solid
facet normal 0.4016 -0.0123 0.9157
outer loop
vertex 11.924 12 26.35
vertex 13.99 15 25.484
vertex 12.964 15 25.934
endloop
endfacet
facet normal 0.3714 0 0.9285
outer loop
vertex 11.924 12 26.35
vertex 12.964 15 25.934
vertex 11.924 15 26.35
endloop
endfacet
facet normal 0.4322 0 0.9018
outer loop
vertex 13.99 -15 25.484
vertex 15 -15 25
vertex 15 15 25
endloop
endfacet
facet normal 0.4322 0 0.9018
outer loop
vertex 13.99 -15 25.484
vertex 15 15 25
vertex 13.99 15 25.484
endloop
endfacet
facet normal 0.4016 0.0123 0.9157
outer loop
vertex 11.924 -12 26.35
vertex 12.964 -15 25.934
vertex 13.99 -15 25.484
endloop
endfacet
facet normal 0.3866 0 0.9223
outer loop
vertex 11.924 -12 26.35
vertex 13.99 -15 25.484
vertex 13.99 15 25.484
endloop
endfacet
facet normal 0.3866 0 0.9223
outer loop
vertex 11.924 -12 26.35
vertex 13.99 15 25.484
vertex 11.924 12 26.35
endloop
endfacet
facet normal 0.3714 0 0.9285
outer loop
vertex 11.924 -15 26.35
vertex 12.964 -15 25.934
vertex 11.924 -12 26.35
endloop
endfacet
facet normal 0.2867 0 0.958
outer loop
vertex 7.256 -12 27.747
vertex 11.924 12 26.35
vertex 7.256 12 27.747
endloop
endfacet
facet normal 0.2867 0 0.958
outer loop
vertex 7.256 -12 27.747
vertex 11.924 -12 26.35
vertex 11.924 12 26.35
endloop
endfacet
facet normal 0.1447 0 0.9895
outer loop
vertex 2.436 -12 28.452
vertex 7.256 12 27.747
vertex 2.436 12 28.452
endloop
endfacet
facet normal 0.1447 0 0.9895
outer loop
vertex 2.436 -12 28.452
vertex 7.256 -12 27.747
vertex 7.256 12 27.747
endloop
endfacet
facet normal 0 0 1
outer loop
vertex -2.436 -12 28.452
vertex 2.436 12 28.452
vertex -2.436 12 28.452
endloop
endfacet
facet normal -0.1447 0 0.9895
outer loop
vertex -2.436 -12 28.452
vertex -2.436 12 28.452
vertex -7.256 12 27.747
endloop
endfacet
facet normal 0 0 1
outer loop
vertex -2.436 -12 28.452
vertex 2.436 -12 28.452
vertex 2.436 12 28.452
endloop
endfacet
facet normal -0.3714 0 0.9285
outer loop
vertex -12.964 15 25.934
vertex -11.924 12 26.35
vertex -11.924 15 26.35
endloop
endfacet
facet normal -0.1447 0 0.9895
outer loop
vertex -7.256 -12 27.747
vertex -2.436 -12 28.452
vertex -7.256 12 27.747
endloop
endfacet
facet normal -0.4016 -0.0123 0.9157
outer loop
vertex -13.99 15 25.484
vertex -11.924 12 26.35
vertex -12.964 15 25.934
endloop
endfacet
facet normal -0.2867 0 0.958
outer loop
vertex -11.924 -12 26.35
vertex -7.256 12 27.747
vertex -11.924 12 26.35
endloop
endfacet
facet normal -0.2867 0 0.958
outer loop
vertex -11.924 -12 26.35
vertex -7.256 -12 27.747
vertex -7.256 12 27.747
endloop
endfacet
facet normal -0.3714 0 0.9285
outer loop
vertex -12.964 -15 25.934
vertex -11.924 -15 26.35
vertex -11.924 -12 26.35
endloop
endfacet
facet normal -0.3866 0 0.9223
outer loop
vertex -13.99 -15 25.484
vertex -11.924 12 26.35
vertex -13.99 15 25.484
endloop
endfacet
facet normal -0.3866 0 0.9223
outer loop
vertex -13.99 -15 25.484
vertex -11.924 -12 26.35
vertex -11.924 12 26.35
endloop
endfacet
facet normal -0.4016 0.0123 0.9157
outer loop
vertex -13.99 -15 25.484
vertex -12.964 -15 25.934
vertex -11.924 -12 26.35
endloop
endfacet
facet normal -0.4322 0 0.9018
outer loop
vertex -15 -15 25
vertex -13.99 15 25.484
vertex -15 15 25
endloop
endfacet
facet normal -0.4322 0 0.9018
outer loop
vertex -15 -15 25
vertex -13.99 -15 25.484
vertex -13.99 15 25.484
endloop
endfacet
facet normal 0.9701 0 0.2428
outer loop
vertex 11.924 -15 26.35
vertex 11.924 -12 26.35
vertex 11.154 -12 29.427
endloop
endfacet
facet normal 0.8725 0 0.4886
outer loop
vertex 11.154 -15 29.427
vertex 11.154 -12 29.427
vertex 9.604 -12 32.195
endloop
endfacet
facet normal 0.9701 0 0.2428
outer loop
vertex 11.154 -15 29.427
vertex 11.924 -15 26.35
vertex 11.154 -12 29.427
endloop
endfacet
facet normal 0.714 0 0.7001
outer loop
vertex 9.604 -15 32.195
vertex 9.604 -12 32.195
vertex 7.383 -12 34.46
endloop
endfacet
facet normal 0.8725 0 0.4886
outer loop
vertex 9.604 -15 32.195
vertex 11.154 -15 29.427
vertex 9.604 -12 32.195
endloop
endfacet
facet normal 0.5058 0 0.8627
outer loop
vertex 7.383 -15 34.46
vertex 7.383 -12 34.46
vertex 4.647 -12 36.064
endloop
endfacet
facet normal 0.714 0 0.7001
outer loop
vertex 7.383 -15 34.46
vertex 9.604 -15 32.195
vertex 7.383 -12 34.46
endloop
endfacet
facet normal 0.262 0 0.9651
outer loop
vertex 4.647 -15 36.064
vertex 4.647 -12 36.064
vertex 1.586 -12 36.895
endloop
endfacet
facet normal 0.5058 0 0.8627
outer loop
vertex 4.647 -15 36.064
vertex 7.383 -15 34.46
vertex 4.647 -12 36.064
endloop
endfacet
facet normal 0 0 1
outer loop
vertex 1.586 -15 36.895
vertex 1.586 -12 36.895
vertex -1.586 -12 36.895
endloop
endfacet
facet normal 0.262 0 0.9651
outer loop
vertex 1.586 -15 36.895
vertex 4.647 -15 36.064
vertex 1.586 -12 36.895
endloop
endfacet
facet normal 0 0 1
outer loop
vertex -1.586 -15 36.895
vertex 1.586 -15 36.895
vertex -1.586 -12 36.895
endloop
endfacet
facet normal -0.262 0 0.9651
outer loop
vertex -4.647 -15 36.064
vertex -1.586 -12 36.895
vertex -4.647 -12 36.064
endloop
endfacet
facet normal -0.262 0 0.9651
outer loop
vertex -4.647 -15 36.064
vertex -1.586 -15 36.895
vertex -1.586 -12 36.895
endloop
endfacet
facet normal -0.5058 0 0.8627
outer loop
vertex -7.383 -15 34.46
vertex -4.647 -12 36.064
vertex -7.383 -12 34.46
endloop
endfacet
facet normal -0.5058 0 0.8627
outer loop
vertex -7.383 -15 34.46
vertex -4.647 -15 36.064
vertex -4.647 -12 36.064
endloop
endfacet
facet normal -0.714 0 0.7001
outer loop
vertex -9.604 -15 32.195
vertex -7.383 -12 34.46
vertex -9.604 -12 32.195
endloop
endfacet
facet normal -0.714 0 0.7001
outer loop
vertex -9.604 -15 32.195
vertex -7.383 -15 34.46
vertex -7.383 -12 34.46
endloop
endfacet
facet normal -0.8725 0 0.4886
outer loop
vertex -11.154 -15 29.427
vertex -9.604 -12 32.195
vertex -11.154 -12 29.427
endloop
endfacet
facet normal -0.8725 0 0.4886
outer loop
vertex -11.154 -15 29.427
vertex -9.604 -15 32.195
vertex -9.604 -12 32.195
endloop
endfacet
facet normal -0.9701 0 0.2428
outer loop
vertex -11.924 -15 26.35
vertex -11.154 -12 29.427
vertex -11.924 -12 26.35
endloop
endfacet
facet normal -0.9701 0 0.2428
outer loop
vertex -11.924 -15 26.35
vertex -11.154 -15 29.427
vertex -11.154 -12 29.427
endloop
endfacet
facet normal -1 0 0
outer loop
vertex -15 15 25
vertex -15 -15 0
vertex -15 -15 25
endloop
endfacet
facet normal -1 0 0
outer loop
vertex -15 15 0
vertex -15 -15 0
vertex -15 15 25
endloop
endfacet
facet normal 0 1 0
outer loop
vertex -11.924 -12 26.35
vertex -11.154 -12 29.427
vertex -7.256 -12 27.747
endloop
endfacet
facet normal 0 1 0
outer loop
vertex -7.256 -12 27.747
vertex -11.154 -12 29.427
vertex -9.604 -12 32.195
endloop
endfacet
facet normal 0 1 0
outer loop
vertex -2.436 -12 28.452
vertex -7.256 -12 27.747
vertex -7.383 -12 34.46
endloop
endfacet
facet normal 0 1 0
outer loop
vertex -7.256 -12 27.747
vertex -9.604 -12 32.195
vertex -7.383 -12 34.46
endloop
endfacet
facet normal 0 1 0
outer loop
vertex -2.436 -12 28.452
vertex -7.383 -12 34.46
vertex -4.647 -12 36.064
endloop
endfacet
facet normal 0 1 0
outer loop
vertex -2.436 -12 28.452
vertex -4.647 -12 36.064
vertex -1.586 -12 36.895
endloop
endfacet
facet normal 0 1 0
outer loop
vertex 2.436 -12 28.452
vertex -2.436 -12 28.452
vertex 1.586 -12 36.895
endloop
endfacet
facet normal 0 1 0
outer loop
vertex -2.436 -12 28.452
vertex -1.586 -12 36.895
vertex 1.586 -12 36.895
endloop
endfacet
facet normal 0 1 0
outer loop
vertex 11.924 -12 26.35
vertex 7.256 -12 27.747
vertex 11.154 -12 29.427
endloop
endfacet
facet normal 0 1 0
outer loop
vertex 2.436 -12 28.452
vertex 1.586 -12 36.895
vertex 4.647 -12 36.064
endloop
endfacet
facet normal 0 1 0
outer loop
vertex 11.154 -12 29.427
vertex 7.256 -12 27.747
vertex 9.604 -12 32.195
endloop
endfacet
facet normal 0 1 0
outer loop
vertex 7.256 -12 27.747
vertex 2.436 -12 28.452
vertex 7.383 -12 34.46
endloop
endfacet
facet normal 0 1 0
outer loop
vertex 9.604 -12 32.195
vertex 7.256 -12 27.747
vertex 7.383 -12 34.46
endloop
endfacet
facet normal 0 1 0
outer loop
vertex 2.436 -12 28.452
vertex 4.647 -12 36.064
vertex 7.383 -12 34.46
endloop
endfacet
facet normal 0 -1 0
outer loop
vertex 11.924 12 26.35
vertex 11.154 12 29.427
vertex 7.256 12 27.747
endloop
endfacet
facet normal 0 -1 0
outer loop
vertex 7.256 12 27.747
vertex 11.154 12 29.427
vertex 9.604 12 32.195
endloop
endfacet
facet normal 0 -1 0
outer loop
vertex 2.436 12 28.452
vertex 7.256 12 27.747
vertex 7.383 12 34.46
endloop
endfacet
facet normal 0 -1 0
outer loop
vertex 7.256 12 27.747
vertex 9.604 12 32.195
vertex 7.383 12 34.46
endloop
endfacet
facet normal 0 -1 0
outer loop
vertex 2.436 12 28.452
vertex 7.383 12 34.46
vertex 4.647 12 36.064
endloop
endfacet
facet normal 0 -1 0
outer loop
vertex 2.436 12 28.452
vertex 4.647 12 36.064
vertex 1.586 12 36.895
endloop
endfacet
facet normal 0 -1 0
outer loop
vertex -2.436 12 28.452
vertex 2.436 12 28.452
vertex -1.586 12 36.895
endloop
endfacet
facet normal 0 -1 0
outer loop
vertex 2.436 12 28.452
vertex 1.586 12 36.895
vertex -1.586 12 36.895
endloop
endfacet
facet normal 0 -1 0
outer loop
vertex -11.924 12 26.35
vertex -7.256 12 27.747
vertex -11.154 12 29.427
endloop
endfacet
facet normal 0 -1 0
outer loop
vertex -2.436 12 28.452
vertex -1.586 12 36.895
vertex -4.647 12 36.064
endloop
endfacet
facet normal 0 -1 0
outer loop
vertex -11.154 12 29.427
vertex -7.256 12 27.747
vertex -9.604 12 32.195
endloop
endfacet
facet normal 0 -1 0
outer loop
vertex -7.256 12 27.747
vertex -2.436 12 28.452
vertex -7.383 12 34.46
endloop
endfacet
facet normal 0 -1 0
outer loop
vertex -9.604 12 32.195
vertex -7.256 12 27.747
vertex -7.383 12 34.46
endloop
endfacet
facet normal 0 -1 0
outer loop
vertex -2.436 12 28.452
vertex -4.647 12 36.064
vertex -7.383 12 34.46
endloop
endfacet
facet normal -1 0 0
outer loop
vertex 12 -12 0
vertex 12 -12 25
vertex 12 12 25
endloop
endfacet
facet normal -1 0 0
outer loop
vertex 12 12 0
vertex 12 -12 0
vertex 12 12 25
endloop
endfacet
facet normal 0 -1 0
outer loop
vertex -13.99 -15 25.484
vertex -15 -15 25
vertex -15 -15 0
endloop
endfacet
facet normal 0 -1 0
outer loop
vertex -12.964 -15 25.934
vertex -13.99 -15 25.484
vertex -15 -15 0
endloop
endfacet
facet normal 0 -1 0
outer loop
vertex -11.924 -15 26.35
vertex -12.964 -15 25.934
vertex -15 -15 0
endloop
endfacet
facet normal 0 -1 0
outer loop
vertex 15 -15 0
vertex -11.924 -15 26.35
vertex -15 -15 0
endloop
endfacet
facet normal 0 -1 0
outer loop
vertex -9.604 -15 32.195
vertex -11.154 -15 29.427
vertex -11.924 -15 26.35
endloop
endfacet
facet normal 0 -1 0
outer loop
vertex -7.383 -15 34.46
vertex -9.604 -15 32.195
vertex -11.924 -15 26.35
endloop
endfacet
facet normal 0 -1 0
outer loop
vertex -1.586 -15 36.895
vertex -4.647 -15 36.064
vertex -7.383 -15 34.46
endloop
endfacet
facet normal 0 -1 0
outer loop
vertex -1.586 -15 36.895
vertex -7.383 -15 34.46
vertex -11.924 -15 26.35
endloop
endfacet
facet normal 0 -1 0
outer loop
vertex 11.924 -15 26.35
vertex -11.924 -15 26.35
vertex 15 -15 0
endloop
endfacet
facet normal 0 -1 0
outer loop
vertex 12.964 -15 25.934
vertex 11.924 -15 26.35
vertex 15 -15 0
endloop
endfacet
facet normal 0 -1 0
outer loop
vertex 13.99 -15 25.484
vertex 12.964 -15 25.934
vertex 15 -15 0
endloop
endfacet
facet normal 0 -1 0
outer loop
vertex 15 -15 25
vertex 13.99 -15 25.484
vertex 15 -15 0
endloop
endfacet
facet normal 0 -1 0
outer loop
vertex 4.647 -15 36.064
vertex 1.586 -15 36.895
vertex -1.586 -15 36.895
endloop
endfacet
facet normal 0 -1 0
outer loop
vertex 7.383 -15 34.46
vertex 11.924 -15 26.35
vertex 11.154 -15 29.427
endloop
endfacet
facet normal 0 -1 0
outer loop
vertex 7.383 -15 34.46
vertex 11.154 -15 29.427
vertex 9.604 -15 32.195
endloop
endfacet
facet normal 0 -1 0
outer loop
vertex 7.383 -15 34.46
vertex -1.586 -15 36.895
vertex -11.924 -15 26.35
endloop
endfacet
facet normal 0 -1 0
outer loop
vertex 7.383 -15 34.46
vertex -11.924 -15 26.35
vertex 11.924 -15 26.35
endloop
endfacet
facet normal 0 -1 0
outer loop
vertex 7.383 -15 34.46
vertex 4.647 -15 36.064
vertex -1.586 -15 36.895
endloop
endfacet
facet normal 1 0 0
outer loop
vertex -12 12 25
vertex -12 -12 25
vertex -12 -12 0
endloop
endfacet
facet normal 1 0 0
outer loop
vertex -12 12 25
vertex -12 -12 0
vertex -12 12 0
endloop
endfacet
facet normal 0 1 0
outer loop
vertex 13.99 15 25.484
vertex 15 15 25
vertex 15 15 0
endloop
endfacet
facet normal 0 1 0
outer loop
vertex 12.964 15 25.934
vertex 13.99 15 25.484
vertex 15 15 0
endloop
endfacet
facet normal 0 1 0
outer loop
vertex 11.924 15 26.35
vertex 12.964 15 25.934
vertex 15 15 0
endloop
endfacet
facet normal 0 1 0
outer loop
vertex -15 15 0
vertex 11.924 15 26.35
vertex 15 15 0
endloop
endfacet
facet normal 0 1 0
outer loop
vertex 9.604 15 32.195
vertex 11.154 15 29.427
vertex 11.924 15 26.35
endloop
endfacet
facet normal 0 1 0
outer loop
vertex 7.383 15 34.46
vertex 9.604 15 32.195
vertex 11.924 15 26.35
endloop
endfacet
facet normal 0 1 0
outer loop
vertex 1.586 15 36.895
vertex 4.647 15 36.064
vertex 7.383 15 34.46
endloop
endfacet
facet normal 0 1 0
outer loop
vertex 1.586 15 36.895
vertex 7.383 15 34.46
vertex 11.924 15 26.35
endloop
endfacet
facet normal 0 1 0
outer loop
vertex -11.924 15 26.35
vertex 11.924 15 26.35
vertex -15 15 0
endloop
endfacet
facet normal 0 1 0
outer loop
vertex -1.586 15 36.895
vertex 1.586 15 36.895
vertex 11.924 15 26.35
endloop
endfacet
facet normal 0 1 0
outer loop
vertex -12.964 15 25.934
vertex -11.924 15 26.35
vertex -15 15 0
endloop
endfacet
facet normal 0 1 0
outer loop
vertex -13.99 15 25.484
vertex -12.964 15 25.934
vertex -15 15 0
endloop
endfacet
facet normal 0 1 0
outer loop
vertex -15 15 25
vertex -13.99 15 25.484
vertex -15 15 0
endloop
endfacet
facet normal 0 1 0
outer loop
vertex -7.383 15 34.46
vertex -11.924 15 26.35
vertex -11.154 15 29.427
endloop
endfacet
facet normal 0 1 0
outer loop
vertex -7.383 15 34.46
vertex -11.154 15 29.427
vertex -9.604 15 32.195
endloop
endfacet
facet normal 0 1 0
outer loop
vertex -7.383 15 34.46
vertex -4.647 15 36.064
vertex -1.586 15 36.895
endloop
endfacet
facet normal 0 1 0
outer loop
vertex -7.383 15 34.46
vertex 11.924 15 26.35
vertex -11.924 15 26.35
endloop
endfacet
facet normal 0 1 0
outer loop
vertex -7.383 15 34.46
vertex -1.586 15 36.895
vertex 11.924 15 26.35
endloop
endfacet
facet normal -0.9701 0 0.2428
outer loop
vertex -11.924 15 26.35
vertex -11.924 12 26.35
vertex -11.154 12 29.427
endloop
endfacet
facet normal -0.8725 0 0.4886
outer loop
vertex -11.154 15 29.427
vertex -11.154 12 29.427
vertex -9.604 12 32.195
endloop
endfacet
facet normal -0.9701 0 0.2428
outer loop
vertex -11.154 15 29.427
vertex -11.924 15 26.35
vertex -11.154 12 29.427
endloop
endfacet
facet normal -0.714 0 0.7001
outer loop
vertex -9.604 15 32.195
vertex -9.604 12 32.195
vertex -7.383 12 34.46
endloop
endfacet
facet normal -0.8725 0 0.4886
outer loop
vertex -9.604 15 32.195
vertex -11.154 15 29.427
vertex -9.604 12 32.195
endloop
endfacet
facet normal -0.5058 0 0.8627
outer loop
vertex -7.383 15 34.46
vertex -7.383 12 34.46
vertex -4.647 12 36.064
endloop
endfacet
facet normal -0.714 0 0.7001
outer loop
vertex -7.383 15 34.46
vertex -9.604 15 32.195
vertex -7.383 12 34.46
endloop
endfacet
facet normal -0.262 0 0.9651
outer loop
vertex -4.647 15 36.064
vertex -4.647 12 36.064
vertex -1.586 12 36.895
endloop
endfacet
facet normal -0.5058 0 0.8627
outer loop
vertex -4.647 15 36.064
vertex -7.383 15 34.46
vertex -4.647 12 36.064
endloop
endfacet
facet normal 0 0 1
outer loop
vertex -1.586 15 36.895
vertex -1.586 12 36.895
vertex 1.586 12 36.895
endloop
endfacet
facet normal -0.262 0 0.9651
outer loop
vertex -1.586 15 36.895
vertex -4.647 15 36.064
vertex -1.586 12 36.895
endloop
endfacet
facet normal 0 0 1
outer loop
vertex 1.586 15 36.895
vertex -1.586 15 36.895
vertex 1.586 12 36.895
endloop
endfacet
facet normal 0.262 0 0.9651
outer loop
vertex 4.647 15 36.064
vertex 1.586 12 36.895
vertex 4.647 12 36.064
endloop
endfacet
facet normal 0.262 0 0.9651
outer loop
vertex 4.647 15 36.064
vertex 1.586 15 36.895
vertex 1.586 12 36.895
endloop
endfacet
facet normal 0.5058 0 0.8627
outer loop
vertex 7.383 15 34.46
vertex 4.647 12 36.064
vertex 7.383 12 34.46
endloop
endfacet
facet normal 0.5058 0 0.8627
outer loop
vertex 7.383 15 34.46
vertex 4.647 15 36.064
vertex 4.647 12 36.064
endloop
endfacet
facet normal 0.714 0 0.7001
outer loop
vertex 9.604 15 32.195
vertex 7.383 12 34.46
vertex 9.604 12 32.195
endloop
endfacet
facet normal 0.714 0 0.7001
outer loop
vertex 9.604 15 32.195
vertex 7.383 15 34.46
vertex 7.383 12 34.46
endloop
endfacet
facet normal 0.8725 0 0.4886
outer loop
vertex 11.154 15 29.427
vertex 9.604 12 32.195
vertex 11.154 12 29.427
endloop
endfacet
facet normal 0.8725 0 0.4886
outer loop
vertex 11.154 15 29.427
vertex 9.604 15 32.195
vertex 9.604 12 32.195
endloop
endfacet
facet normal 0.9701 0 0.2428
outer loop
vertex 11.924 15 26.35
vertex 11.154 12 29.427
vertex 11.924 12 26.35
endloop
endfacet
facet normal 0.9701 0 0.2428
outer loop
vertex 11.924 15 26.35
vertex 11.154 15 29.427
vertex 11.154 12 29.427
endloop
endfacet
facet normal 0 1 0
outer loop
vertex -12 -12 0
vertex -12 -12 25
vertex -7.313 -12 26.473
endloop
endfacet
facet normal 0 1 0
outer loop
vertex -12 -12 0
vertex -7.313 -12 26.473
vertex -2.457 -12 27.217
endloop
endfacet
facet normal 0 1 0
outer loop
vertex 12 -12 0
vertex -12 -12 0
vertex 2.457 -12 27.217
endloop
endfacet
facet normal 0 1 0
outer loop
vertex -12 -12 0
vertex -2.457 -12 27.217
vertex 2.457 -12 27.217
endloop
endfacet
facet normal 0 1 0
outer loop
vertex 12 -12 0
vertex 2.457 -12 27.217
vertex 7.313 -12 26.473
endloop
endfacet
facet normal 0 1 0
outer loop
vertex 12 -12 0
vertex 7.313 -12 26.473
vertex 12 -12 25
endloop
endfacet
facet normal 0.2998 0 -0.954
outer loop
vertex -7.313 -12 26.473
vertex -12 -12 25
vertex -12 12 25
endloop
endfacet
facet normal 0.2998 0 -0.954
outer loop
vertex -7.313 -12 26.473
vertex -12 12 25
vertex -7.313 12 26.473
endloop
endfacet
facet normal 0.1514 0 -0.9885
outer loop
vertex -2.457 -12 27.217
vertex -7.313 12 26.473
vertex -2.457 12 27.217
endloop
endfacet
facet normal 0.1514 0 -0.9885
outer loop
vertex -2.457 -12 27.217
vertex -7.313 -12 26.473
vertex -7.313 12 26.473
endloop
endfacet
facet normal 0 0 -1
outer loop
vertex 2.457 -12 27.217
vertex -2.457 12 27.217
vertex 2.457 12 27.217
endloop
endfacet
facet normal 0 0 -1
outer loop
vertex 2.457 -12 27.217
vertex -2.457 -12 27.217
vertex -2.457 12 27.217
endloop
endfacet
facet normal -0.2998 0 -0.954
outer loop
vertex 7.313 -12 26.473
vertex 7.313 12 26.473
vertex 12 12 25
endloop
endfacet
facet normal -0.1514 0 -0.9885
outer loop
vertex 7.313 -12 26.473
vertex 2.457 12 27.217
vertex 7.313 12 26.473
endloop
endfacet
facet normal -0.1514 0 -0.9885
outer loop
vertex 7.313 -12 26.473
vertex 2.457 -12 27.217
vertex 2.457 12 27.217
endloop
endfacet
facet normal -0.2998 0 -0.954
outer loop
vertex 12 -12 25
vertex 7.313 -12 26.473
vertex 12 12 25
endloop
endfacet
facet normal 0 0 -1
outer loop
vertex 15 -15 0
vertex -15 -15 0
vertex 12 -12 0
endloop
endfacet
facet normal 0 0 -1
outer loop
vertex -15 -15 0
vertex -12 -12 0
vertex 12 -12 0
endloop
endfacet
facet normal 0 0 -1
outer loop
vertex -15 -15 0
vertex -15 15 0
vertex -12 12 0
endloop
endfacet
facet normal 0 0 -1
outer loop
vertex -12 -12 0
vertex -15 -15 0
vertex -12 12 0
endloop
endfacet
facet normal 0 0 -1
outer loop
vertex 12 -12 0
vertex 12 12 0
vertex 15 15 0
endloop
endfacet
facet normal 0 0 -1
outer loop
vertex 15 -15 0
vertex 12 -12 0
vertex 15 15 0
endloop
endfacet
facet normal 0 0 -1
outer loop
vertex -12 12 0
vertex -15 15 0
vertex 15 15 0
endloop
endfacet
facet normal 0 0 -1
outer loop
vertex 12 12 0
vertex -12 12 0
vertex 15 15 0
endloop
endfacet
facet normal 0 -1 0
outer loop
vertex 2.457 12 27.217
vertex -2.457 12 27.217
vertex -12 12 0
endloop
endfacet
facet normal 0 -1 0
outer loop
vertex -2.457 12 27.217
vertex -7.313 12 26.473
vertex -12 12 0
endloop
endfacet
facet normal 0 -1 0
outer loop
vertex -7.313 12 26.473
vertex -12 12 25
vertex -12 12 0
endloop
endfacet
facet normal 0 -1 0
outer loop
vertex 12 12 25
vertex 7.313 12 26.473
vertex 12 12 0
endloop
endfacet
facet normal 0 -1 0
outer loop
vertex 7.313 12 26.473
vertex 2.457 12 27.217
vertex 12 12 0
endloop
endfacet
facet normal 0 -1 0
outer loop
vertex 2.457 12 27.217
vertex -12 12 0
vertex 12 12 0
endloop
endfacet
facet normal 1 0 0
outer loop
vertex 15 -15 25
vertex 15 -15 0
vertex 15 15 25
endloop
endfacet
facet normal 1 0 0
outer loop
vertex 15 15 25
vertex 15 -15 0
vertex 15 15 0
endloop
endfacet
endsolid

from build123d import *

# Parameters (mm, degrees)
F0_W          = 30
F0_H          = 30
F0_W_2        = 24
F0_H_2        = 24
F1_DEPTH      = 25
F3_DEPTH      = 15
F3_DEPTH_BACK = 15
F5_DEPTH      = 3
F7_DEPTH      = 3


with BuildPart() as f1:
    # F0 (on Top) → F1 (new body)
    with BuildSketch(Plane.XY):
        Rectangle(F0_W, F0_H)
        Rectangle(F0_W_2, F0_H_2, mode=Mode.SUBTRACT)
    extrude(amount=F1_DEPTH)

    # F2 (on Front) → F3 (join, two sides)
    with BuildSketch(Plane.XZ) as f3_sk:
        with BuildLine():
            Line((12, 25), (15, 25))
            ThreePointArc((15, 25), (0, 28.5410196625), (-15, 25))
            Line((-15, 25), (-12, 25))
            ThreePointArc((-12, 25), (0, 27.3109888428), (12, 25))
        make_face()
    extrude(amount=F3_DEPTH)
    extrude(f3_sk.sketch, amount=-F3_DEPTH_BACK)

    # F4 (on face) → F5 (join, through all)
    with BuildSketch(Plane(origin=(0, 15, 0), x_dir=(-1, 0, 0), z_dir=(0, 1, 0))):
        with BuildLine():
            Line((-12, 25), (12, 25))
            ThreePointArc((12, 25), (0, 37), (-12, 25))
        make_face()
    extrude(amount=-F5_DEPTH)

    # F6 (on face) → F7 (join, through all)
    with BuildSketch(Plane.XZ.offset(15)):
        with BuildLine():
            Line((-12, 25), (12, 25))
            ThreePointArc((12, 25), (0, 37), (-12, 25))
        make_face()
    extrude(amount=-F7_DEPTH)


solid = f1.part
